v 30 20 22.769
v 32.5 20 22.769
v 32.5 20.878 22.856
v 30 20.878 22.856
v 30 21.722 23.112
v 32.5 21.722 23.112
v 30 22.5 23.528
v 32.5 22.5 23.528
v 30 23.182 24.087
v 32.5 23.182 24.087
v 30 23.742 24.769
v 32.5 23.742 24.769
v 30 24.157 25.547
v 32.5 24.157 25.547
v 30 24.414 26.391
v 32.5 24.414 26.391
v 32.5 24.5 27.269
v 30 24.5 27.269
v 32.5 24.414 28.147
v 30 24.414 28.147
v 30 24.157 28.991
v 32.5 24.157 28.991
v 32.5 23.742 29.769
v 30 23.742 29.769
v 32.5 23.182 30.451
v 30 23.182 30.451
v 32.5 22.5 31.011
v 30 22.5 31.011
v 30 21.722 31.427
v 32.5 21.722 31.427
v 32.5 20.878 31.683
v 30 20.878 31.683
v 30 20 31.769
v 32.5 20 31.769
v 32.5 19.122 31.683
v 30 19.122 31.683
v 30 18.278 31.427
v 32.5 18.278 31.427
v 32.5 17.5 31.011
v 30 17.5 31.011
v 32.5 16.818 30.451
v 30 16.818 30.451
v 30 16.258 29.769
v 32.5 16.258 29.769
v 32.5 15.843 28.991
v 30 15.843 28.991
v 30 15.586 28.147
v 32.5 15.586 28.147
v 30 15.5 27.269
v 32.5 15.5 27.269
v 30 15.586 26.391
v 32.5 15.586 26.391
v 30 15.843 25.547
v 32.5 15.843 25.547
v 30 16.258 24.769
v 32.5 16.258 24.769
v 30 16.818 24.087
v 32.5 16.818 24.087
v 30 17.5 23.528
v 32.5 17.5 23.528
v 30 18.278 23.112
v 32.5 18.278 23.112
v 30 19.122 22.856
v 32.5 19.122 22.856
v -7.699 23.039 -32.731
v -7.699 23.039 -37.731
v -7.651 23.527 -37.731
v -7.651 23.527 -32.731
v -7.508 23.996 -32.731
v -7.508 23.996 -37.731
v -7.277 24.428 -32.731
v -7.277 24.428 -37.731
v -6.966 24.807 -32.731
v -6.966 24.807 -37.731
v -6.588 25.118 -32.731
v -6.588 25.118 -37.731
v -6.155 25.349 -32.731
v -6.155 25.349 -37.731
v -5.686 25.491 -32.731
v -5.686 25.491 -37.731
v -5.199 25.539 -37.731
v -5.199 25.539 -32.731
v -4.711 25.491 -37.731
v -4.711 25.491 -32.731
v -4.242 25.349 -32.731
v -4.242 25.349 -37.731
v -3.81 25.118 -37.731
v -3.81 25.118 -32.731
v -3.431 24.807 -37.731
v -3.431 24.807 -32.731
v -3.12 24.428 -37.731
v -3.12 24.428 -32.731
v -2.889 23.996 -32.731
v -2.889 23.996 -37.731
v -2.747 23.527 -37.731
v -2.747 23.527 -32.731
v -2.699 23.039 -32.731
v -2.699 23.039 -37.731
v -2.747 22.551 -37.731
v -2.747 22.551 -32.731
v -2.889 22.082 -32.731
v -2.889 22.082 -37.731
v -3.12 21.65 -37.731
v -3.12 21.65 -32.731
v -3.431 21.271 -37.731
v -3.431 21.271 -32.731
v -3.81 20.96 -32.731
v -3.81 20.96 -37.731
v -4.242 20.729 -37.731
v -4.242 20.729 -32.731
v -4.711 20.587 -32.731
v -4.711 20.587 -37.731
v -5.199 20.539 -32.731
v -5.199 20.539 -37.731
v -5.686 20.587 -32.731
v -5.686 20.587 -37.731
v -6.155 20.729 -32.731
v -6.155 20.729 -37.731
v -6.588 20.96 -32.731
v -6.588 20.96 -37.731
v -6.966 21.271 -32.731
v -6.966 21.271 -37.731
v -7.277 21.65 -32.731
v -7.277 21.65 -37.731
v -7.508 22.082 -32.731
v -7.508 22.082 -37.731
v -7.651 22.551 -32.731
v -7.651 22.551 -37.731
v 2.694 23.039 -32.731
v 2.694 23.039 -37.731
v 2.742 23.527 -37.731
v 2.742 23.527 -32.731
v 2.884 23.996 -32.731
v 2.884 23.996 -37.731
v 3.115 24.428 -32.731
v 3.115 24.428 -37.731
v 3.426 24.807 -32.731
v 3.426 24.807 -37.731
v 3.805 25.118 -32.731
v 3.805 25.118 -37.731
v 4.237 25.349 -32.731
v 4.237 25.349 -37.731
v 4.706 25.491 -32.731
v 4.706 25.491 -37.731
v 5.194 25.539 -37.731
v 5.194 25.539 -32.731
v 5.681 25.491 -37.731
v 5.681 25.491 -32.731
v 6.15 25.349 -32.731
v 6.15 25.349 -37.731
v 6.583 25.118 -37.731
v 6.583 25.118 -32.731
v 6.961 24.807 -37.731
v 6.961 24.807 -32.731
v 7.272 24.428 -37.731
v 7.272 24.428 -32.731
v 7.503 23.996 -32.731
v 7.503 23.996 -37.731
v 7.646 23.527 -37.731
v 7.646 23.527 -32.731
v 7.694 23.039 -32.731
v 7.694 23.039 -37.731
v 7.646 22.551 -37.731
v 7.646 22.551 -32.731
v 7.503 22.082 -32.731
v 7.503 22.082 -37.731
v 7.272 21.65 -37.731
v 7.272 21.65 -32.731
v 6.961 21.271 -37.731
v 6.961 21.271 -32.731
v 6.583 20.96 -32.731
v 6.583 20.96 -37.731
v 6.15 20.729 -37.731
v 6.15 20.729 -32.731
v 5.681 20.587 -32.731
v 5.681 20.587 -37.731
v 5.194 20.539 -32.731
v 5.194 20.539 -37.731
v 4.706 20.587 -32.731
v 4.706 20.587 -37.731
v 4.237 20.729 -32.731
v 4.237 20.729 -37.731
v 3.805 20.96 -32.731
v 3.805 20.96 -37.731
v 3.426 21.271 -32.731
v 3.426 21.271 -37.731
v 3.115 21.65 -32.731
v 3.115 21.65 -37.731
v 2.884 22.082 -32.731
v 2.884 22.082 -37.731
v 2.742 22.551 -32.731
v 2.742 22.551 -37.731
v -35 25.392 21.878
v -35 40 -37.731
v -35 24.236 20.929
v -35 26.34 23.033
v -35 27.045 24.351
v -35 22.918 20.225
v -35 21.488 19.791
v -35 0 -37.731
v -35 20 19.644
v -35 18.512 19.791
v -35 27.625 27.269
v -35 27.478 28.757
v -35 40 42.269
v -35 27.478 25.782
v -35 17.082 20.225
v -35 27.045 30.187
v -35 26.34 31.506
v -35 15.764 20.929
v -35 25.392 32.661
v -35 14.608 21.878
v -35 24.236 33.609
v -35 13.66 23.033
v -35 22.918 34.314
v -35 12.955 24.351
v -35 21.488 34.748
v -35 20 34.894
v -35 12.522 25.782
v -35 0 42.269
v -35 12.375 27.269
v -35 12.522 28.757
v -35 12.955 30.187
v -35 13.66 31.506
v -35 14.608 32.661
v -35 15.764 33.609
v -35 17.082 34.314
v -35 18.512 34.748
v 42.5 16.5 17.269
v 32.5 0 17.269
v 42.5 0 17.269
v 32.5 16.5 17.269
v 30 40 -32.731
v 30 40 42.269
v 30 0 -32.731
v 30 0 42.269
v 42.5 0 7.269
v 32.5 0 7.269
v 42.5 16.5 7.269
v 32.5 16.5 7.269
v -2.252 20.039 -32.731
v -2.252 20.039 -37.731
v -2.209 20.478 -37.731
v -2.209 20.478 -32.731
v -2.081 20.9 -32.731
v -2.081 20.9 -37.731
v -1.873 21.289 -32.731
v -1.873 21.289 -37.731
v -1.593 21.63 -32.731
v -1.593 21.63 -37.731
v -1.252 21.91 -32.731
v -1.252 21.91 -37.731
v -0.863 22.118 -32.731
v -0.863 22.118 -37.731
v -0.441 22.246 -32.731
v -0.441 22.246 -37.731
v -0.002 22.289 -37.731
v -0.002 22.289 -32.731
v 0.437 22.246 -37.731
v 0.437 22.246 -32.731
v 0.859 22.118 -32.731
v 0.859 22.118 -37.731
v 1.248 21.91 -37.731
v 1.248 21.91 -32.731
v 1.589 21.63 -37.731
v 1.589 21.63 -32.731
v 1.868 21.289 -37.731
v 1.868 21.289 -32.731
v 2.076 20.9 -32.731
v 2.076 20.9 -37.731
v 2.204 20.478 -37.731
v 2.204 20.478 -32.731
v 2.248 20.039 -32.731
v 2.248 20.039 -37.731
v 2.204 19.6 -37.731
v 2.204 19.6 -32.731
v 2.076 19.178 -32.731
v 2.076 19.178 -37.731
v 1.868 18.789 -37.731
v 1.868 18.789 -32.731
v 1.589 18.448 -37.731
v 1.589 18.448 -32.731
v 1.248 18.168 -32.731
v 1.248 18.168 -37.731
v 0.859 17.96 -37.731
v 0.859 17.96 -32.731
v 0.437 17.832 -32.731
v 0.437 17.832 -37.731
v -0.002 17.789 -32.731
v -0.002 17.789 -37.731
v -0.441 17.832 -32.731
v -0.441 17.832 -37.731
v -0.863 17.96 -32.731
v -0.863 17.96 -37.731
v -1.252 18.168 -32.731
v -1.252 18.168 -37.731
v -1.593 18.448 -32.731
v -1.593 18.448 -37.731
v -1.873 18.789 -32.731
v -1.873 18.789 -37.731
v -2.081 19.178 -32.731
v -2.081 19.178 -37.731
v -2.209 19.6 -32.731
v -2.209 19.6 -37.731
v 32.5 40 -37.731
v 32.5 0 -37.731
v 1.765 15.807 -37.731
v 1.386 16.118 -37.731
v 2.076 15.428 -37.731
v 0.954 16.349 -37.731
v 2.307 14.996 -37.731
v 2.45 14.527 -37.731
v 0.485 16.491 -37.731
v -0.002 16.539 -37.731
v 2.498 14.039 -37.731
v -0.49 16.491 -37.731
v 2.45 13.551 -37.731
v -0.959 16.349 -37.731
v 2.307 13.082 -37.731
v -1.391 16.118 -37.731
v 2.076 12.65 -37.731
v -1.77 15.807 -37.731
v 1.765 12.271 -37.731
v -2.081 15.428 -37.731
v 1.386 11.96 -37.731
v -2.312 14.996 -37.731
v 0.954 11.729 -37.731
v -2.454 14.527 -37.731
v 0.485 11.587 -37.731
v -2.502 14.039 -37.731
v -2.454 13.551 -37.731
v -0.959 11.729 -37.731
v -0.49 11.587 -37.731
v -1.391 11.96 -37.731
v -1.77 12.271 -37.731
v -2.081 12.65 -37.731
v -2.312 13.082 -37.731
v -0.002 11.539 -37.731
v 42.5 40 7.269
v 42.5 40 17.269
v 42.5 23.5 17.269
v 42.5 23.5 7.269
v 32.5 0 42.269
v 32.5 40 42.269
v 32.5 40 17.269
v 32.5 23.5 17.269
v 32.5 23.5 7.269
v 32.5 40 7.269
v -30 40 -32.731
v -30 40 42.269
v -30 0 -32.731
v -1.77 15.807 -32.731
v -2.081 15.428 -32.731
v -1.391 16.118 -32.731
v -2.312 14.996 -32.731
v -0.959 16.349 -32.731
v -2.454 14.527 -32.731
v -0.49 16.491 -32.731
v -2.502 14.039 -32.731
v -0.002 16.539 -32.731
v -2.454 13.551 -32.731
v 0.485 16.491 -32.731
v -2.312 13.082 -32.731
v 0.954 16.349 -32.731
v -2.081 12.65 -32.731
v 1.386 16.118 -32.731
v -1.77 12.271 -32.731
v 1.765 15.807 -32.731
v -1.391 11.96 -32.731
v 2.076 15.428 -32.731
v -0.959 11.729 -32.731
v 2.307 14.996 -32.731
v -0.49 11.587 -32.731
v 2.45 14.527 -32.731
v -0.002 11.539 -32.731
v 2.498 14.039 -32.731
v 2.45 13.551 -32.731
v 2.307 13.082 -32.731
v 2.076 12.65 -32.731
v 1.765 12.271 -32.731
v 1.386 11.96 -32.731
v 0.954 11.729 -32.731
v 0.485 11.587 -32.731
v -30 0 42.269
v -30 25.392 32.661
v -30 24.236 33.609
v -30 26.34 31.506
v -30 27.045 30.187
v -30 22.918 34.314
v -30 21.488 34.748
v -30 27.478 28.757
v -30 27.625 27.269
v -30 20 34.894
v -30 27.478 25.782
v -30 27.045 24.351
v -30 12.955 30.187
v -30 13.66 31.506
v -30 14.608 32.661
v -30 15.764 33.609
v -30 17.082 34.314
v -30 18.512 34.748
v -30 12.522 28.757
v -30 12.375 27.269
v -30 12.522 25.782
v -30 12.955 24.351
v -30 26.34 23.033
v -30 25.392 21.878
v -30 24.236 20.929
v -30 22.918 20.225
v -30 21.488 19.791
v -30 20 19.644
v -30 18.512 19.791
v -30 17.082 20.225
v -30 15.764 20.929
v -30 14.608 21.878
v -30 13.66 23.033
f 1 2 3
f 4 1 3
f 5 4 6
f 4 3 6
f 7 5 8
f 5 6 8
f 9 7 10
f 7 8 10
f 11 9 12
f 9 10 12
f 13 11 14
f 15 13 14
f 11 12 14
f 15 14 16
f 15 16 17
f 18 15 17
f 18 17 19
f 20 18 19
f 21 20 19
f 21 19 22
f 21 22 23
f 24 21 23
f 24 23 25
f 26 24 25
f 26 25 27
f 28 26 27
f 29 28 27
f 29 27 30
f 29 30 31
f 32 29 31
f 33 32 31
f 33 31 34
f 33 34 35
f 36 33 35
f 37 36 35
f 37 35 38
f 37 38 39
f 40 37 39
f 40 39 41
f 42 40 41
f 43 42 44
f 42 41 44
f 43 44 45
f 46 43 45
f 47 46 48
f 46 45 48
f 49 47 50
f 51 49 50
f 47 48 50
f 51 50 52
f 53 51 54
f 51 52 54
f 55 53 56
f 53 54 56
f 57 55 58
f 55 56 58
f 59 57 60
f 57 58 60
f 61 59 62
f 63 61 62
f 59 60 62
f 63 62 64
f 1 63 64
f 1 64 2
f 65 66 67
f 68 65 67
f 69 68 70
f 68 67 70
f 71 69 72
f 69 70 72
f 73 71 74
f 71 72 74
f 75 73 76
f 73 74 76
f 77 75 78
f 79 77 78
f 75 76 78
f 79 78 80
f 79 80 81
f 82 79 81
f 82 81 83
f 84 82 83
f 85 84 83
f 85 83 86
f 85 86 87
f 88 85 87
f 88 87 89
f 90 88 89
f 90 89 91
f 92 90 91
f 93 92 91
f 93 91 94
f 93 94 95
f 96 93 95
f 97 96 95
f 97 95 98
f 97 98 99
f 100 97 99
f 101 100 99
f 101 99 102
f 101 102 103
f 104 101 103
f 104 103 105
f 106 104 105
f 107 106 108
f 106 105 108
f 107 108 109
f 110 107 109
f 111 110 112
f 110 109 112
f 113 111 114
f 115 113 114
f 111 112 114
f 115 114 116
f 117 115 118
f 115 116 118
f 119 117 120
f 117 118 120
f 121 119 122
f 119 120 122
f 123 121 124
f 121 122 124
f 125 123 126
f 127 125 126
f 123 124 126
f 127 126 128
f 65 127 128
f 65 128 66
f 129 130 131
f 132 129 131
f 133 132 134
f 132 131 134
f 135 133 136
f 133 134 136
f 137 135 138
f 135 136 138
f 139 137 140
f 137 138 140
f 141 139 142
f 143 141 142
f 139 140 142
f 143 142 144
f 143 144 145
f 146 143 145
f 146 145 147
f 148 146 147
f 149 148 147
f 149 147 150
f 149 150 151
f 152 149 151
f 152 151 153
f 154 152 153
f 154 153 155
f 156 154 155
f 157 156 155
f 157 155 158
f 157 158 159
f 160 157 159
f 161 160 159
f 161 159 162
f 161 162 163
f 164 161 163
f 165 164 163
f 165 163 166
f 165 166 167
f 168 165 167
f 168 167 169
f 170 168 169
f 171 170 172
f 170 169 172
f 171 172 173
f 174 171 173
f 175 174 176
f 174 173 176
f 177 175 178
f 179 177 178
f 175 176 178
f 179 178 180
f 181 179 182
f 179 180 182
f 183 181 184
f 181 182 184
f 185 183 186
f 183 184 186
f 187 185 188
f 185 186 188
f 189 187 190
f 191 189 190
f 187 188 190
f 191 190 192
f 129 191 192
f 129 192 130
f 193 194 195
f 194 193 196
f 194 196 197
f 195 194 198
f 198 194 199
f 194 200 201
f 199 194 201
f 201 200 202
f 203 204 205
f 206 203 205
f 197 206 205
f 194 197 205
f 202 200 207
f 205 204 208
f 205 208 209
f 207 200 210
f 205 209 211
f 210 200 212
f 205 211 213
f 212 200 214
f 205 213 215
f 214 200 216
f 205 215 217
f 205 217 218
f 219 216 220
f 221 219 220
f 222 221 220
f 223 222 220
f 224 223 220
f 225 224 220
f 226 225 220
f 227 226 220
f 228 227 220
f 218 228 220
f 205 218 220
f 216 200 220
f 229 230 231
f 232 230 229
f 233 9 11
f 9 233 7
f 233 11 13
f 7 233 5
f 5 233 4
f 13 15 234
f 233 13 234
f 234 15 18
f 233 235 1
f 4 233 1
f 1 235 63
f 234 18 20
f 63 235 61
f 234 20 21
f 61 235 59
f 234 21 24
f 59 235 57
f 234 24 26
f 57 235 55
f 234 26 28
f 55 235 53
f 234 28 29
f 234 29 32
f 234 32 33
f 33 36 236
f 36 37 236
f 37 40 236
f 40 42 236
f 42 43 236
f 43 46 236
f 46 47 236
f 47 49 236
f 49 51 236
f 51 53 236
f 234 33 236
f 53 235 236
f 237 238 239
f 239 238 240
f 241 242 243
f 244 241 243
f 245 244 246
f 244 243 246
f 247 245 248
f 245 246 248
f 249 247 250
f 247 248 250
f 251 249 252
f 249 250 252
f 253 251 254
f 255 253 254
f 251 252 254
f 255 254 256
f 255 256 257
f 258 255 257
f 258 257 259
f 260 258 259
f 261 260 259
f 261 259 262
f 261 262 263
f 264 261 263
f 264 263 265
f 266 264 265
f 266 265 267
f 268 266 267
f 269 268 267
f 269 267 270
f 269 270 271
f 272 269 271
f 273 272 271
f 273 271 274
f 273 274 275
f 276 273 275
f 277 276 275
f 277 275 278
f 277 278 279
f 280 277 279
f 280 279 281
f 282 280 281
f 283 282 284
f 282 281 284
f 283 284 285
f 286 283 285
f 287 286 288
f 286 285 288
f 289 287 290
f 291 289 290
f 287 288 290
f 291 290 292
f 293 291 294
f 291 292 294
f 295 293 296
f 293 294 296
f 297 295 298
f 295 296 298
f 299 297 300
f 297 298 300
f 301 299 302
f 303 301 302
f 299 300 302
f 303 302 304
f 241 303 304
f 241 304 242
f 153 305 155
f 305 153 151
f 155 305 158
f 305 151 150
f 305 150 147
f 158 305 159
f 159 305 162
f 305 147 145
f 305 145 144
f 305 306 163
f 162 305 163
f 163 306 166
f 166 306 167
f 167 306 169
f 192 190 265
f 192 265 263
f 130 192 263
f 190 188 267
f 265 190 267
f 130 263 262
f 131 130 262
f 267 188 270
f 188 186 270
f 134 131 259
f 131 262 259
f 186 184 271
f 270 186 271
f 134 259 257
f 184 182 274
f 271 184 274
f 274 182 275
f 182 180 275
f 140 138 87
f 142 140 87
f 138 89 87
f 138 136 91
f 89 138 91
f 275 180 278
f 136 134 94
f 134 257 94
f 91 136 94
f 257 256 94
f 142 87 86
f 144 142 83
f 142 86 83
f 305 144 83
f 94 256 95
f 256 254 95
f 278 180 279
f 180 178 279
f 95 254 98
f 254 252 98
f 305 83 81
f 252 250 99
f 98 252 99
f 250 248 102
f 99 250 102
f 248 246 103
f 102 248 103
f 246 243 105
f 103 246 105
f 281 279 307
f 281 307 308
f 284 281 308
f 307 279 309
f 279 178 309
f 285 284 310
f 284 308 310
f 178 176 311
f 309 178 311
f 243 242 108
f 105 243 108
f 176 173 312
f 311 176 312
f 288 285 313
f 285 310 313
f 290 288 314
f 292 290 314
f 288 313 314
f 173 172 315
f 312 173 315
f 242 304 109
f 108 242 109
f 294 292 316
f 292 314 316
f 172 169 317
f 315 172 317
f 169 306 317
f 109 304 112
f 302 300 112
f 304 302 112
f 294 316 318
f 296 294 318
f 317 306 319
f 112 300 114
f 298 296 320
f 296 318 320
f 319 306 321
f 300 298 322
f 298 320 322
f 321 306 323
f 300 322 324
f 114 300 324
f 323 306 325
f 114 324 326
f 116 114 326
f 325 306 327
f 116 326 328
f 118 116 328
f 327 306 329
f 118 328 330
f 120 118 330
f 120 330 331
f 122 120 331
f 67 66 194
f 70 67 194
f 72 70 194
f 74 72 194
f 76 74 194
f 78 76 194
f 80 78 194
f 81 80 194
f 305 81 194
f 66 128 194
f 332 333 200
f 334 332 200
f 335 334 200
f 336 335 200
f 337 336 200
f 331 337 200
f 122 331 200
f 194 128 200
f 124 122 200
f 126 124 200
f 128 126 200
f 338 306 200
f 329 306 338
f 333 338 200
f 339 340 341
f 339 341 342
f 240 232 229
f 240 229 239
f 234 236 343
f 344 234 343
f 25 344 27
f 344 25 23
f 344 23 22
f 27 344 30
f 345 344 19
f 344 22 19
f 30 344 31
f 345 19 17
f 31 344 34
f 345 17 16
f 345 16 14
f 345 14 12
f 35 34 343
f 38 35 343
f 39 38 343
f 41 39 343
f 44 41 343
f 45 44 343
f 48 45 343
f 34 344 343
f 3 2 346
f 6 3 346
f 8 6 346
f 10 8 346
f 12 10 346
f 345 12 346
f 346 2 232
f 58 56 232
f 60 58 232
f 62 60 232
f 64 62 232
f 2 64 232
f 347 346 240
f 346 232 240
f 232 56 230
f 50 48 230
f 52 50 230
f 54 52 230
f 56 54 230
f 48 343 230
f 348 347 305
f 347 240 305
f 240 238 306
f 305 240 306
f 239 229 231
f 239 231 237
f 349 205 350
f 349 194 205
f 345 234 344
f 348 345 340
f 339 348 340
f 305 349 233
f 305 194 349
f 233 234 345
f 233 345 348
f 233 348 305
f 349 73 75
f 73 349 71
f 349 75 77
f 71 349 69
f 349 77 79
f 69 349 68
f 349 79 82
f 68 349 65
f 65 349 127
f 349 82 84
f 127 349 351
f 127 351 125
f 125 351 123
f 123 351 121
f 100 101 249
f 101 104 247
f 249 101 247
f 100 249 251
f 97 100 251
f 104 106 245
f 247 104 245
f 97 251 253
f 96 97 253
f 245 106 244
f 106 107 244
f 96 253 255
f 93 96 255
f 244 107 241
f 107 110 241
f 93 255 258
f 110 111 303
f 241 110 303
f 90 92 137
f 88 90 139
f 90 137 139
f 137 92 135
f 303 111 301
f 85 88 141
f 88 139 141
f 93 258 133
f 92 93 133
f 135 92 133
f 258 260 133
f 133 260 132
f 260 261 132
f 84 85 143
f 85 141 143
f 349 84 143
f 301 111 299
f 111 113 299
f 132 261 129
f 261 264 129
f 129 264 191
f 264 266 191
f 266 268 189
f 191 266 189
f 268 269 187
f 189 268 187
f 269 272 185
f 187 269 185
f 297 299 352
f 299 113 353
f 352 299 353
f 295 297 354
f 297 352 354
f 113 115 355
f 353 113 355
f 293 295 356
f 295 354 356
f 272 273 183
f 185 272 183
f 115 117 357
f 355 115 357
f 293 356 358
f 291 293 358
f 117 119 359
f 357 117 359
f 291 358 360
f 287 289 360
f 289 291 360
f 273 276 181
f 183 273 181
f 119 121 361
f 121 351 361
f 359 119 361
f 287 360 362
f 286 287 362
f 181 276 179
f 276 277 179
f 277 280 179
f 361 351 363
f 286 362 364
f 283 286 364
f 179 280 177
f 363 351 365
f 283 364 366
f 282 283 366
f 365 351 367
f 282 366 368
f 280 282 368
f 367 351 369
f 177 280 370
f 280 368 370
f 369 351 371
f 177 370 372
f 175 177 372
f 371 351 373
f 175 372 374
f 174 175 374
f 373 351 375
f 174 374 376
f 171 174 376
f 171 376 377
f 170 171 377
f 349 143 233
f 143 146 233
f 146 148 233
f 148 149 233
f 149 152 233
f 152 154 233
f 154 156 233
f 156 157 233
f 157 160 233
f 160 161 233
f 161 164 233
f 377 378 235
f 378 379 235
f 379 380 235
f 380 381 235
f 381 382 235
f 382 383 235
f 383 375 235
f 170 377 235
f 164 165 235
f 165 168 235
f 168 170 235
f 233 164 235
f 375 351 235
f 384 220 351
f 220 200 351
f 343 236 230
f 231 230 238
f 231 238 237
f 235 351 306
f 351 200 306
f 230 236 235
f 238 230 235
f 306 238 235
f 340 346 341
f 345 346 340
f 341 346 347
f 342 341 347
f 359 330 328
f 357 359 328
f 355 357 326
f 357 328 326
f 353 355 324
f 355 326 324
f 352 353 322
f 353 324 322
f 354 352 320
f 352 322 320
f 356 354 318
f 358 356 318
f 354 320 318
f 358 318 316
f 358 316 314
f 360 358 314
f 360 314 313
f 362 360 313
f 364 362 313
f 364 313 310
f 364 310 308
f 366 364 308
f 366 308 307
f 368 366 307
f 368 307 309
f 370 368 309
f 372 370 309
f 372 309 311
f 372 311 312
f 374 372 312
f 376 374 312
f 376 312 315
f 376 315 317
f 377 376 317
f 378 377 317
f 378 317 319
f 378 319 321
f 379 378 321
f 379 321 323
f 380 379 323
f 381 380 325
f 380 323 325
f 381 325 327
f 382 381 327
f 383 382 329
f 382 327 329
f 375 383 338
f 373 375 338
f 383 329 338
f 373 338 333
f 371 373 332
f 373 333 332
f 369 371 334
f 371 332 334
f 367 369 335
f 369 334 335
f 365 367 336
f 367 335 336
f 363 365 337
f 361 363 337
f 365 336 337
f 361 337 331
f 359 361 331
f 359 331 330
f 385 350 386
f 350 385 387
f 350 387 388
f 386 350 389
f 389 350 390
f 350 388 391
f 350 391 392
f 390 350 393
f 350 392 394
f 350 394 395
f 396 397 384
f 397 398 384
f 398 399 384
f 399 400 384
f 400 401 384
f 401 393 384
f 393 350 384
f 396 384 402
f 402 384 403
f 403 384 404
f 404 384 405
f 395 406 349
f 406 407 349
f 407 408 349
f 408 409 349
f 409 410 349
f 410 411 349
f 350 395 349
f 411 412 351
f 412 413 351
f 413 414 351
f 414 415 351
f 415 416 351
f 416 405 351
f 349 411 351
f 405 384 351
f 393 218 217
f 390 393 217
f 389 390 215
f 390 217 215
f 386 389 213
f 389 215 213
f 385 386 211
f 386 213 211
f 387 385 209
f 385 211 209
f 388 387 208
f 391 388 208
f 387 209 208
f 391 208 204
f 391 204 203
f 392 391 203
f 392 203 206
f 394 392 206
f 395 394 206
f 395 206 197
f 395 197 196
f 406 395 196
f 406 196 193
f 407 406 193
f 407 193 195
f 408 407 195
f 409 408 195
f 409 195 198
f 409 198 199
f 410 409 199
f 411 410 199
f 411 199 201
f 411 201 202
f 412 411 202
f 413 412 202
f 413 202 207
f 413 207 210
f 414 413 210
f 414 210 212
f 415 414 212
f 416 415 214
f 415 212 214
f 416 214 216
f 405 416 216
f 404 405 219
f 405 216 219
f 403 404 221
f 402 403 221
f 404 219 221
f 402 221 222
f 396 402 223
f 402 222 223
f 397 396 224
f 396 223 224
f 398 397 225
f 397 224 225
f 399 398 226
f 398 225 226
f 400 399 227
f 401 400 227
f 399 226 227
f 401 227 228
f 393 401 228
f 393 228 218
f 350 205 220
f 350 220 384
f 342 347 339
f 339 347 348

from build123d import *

# Parameters (mm, degrees)
BOSS_EXTRUDE1_DEPTH = 40
SKETCH2_R           = 2.5
CUT_EXTRUDE1_DEPTH  = 97.046863561
CUT_EXTRUDE2_REACH  = 91.123
SKETCH3_R           = 7.625
SKETCH4_R           = 4.5
CUT_EXTRUDE4_DEPTH  = 10
SKETCH4_4_W         = 10
SKETCH4_4_H         = 16.5
BOSS_EXTRUDE2_DEPTH = 10
CUT_EXTRUDE5_REACH  = 101.027
SKETCH2_3_R         = 2.25


with BuildPart() as part:
    # Sketch1 → Boss-Extrude1 (new body)
    with BuildSketch(Plane(origin=(0, 0, 0), x_dir=(1, 0, 0), z_dir=(0, 1, 0))):
        Polygon((-35, -42.269292904), (-30, -42.269292904), (-30, 32.730707096), (30, 32.730707096), (30, -42.269292904), (32.5, -42.269292904), (32.5, 37.730707096), (-35, 37.730707096), align=None)
    extrude(amount=BOSS_EXTRUDE1_DEPTH)

    # Sketch2 → Cut-Extrude1 (cut, through all)
    with BuildSketch(Plane(origin=(0, 0, -37.730707096), x_dir=(-1, 0, 0), z_dir=(0, 0, -1))):
        with Locations((5.1985867, 23.03894843)):
            Circle(SKETCH2_R)
        with Locations((0.002434277, 14.03894843)):
            Circle(SKETCH2_R)
        with Locations((-5.193718146, 23.03894843)):
            Circle(SKETCH2_R)
    extrude(amount=-CUT_EXTRUDE1_DEPTH, mode=Mode.SUBTRACT)

    # Sketch3 → Cut-Extrude2 (cut, up to next)
    with BuildSketch(Plane.ZY.offset(35), mode=Mode.PRIVATE) as cut_extrude2_sk1:
        with Locations((27.269292904, 20)):
            Circle(SKETCH3_R)
    cut_extrude2_tool1 = extrude(cut_extrude2_sk1.sketch, amount=-CUT_EXTRUDE2_REACH, mode=Mode.PRIVATE) & part.part
    add(cut_extrude2_tool1.solids().sort_by_distance((-35, 20, 27.269293))[0], mode=Mode.SUBTRACT)

    # Sketch4 → Cut-Extrude4 (cut)
    with BuildSketch(Plane(origin=(32.5, 0, 0), x_dir=(0, 0, -1), z_dir=(1, 0, 0))):
        with Locations((-27.269292904, 20)):
            Circle(SKETCH4_R)
    extrude(amount=-CUT_EXTRUDE4_DEPTH, mode=Mode.SUBTRACT)

    # Sketch4<4> → Boss-Extrude2 (add)
    with BuildSketch(Plane(origin=(32.5, 0, 0), x_dir=(0, 0, -1), z_dir=(1, 0, 0))):
        with Locations((-12.269292904, 8.25)):
            Rectangle(SKETCH4_4_W, SKETCH4_4_H)
        with Locations((-12.269292904, 31.75)):
            Rectangle(SKETCH4_4_W, SKETCH4_4_H)
    extrude(amount=BOSS_EXTRUDE2_DEPTH)

    # Sketch2<3> → Cut-Extrude5 (cut, up to next)
    with BuildSketch(Plane(origin=(0, 0, -37.730707096), x_dir=(-1, 0, 0), z_dir=(0, 0, -1)), mode=Mode.PRIVATE) as cut_extrude5_sk1:
        with Locations((0.002434277, 20.03894843)):
            Circle(SKETCH2_3_R)
    cut_extrude5_tool1 = extrude(cut_extrude5_sk1.sketch, amount=-CUT_EXTRUDE5_REACH, mode=Mode.PRIVATE) & part.part
    add(cut_extrude5_tool1.solids().sort_by_distance((-0.002434, 20.038948, -37.730707))[0], mode=Mode.SUBTRACT)


solid = part.part
